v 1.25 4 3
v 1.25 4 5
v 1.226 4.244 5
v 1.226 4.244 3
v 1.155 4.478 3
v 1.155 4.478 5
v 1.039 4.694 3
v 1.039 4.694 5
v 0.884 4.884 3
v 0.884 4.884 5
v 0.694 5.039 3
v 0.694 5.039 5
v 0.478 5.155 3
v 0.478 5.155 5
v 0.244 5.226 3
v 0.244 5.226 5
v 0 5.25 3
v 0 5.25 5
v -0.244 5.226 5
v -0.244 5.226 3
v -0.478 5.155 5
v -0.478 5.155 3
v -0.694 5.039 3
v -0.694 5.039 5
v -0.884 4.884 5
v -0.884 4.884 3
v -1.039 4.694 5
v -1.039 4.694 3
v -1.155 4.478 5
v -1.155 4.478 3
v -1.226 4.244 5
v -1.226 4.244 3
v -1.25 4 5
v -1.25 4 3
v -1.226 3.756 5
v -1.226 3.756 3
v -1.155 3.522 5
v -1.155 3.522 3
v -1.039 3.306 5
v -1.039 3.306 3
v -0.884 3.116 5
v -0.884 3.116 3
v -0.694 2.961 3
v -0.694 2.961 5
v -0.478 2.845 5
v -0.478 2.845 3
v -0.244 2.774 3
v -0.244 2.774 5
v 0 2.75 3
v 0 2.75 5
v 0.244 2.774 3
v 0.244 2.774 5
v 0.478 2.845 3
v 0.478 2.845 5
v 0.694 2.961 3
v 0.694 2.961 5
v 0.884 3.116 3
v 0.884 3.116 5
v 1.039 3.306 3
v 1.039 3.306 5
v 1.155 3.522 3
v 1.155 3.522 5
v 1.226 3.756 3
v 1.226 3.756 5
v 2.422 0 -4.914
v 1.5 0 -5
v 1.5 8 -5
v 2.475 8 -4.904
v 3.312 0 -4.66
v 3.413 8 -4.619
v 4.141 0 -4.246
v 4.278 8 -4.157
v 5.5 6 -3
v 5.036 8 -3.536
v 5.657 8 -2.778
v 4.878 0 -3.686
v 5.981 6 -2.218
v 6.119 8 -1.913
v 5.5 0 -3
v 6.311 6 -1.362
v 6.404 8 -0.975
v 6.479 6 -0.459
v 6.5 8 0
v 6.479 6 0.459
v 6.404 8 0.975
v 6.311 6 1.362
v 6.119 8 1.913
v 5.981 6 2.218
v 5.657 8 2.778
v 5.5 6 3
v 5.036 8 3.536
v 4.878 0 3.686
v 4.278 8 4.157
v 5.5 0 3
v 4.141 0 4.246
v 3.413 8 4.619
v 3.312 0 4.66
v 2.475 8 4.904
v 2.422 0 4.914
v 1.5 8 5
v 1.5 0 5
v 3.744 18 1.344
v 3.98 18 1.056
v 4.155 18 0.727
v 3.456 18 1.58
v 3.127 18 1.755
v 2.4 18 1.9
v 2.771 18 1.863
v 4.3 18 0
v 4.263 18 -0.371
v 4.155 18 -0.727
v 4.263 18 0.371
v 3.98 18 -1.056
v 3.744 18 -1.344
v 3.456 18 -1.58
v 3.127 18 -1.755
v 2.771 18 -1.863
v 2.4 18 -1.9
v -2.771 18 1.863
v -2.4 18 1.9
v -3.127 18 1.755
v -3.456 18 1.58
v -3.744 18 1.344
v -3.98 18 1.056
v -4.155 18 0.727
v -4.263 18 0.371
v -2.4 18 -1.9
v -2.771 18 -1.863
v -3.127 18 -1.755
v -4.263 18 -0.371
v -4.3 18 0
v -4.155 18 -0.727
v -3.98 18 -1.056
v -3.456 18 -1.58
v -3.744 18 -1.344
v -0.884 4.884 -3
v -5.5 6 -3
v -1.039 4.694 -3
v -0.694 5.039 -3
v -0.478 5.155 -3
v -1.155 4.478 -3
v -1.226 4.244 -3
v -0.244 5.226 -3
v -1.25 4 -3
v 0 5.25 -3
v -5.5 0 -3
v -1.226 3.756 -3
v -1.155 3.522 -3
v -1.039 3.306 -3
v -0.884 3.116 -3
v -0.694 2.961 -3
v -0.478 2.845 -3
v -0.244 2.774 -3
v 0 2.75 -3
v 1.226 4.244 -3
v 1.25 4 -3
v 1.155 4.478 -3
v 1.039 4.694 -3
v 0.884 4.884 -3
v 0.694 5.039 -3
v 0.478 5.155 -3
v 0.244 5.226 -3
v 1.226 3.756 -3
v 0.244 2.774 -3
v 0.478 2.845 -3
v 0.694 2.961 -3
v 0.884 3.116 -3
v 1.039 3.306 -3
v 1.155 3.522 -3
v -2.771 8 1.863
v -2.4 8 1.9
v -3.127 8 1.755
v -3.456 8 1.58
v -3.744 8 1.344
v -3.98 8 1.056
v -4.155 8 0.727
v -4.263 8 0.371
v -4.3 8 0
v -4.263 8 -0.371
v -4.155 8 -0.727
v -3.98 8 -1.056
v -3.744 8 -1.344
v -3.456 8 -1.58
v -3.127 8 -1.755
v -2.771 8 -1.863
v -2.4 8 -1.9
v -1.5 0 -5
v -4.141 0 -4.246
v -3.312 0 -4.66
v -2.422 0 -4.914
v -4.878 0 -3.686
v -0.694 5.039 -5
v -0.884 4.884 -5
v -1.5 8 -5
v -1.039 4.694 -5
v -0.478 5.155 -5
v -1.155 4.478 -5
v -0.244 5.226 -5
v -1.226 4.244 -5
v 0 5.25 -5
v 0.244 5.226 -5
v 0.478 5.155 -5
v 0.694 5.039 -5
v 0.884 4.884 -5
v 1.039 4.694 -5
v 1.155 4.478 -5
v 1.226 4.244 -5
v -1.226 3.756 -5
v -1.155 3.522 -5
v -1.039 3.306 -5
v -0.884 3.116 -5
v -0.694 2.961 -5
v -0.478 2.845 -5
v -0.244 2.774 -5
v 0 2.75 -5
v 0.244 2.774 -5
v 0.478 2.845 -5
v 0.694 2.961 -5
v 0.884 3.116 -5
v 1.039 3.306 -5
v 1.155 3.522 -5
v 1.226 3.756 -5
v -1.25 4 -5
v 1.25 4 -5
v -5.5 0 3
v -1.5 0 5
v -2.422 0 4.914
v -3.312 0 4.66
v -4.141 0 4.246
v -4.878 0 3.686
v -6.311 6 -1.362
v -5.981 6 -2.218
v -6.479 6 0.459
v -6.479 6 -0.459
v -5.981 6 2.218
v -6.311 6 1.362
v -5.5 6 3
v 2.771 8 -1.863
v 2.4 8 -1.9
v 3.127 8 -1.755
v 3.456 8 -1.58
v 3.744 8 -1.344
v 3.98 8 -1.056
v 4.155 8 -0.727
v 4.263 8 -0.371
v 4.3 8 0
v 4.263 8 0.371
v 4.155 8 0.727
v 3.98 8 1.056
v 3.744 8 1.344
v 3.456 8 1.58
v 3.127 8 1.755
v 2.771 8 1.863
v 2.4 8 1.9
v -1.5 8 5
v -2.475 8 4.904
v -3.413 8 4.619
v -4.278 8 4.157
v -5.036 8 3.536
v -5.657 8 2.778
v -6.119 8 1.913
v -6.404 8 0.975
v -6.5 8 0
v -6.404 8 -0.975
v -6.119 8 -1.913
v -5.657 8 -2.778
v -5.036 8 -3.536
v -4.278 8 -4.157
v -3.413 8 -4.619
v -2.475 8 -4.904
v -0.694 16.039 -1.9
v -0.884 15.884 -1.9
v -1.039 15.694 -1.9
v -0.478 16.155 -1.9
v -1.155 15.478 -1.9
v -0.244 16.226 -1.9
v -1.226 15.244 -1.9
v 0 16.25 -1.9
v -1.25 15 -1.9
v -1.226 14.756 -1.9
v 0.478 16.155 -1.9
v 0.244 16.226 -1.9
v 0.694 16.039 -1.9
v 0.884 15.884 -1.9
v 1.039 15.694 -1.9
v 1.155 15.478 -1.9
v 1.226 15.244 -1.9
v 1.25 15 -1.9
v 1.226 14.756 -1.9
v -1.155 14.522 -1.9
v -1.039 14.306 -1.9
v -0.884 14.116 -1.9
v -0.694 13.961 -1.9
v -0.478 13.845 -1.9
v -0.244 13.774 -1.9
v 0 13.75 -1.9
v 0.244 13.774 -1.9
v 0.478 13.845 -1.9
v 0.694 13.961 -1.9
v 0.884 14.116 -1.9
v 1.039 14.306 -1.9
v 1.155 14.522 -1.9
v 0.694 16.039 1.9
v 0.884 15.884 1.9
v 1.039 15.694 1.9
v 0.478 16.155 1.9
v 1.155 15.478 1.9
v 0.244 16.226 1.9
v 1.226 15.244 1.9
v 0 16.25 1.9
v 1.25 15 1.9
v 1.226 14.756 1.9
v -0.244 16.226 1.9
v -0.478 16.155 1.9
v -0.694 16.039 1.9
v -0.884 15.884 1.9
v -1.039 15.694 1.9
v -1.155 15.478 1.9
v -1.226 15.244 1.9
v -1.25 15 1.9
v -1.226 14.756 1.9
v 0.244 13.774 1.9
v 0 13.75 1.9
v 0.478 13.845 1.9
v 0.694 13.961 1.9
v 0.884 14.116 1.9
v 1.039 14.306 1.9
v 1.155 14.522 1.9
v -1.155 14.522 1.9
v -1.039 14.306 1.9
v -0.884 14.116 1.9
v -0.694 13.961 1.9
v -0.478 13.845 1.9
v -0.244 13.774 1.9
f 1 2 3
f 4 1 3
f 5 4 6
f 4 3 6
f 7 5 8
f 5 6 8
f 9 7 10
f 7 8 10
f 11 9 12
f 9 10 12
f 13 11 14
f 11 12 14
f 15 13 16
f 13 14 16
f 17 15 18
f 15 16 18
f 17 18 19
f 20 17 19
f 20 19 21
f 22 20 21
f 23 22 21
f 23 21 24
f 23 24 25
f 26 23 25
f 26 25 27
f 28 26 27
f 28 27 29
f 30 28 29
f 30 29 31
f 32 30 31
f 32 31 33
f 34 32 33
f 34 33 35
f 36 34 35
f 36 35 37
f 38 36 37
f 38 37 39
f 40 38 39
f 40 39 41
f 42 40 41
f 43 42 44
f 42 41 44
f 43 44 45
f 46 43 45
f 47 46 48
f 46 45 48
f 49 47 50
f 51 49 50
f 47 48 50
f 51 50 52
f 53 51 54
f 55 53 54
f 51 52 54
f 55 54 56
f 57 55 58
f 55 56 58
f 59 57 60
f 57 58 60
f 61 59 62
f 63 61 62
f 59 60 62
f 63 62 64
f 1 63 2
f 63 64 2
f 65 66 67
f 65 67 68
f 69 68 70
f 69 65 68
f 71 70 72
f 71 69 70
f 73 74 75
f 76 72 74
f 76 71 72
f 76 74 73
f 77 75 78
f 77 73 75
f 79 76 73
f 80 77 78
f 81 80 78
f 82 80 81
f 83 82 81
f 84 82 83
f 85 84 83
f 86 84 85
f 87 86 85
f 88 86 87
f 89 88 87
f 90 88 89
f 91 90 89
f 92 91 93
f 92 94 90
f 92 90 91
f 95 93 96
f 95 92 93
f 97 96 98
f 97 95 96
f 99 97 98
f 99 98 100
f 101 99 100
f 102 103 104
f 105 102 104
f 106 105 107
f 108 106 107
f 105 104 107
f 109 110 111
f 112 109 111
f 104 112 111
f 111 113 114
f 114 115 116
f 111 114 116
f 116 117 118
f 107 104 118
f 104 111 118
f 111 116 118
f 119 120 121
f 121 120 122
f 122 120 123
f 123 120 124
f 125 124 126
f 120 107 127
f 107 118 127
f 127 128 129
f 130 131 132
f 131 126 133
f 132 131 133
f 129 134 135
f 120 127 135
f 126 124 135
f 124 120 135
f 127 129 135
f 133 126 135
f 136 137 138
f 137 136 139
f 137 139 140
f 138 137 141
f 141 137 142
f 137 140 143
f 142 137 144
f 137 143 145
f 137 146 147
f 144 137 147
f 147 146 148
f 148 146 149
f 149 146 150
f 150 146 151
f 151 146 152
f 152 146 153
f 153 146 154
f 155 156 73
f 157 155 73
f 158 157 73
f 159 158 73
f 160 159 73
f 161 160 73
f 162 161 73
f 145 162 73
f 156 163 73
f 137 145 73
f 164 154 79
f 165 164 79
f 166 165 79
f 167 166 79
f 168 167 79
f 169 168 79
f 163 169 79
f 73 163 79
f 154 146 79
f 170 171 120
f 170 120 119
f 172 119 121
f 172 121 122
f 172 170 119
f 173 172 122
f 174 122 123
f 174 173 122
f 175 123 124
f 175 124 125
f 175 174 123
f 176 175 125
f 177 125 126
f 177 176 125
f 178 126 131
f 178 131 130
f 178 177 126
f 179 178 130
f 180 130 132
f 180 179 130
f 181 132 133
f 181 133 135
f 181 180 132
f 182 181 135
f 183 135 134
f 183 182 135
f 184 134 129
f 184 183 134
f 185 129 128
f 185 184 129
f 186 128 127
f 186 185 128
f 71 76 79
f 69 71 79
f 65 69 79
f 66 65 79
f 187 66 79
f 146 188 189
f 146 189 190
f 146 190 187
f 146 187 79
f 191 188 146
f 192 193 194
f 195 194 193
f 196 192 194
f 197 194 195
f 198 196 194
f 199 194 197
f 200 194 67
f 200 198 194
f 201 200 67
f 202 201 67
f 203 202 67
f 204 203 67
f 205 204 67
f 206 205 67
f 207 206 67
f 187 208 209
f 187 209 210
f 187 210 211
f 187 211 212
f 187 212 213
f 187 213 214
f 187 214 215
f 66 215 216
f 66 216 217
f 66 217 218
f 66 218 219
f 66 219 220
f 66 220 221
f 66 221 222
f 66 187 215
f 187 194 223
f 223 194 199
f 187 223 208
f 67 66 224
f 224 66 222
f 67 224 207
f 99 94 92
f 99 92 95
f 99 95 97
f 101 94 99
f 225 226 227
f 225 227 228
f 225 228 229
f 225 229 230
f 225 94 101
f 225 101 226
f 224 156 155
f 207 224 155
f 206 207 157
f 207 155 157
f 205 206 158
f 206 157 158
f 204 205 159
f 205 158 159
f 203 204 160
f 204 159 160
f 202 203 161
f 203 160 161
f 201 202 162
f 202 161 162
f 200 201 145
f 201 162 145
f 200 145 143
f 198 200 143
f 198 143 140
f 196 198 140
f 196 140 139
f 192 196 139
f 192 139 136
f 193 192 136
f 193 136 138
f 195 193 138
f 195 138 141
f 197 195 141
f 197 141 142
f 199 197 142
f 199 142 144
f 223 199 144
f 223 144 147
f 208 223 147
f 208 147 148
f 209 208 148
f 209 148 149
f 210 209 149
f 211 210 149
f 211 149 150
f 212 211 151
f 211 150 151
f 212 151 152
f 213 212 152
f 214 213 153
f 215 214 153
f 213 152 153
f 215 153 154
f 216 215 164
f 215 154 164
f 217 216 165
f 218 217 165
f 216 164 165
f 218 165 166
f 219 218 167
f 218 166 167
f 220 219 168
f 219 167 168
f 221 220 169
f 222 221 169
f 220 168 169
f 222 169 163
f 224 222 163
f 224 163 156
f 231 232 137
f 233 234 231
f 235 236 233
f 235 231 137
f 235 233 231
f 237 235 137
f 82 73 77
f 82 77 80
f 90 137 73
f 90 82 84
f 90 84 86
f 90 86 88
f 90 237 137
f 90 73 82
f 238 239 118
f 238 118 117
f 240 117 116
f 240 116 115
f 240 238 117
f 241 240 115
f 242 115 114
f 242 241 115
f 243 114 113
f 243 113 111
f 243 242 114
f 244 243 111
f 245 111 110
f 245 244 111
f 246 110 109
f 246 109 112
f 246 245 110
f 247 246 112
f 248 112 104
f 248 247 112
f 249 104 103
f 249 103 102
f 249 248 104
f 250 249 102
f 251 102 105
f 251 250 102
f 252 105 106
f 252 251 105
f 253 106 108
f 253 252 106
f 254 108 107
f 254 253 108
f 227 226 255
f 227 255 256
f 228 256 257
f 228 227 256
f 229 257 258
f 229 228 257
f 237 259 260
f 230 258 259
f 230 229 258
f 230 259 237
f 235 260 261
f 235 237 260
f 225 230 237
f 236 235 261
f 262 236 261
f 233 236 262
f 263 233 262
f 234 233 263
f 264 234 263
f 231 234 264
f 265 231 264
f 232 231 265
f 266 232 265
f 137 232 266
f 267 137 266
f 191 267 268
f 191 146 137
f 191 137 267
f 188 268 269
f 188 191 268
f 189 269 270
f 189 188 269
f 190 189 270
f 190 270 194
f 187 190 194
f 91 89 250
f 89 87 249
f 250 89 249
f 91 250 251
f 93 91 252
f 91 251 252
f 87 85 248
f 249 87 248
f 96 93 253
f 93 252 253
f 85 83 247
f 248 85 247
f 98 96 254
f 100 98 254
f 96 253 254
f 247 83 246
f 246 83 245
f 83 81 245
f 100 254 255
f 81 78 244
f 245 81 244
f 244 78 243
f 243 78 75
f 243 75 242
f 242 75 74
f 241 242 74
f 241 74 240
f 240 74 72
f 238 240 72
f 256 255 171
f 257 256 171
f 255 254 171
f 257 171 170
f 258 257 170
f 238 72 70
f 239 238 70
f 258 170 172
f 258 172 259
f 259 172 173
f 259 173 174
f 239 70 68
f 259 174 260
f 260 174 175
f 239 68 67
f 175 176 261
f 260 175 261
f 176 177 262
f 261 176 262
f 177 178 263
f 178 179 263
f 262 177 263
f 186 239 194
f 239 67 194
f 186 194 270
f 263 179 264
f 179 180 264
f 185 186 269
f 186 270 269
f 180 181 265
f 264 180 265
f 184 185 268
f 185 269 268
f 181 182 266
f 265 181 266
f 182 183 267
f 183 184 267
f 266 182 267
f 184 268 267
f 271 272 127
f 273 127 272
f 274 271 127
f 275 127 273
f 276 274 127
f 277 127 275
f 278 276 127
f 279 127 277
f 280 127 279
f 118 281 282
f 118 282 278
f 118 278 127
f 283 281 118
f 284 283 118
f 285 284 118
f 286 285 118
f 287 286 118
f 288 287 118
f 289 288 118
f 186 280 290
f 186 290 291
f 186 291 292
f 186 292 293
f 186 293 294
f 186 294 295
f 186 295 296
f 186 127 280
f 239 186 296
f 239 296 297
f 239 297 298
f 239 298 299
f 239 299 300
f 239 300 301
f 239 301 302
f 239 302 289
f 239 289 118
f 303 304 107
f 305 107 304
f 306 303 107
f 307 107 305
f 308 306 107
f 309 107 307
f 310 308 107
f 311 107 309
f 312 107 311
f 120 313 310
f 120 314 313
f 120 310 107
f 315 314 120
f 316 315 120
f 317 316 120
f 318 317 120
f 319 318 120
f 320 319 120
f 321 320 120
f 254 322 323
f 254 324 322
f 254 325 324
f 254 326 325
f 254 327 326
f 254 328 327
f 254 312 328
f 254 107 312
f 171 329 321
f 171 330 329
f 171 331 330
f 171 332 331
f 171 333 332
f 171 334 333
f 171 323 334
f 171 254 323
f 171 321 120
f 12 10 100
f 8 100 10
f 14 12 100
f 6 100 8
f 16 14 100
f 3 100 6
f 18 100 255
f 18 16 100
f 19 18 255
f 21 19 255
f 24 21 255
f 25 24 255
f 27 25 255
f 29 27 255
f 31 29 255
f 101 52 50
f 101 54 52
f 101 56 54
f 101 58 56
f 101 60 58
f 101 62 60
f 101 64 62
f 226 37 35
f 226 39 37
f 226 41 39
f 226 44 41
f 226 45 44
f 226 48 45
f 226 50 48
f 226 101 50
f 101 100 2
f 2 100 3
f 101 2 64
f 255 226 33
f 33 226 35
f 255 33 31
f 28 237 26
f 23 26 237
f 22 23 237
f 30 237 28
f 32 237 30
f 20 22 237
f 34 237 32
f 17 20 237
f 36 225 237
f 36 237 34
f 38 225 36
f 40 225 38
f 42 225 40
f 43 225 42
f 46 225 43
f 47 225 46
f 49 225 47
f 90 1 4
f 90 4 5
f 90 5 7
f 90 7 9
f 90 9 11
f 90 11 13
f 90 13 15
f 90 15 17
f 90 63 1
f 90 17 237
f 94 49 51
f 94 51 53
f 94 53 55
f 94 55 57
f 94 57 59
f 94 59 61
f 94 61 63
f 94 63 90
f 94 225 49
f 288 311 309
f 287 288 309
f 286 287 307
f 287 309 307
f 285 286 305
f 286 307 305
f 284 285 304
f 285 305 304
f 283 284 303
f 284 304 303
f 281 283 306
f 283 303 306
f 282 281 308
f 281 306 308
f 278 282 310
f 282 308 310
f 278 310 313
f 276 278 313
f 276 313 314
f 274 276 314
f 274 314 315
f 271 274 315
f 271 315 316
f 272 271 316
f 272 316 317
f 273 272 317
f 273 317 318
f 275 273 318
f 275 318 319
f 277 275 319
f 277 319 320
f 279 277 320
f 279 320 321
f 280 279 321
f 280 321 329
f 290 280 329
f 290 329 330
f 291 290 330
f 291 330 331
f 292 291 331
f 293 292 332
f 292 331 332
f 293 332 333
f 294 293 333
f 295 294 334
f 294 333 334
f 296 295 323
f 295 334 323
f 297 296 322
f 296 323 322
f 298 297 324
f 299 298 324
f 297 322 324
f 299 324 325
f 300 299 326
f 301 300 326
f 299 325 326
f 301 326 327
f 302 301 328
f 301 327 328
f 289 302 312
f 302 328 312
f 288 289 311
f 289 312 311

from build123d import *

# Parameters (mm, degrees)
EXTRUDE_1_DEPTH     = 8
EXTRUDE_2_DEPTH     = 10
SKETCH_3_R          = 1.25
CUT_EXTRUDE_1_DEPTH = 6
SKETCH_4_W          = 25.11911159
SKETCH_4_H          = 6
CUT_EXTRUDE_2_DEPTH = 6
SKETCH_5_R          = 1.25
CUT_EXTRUDE_3_DEPTH = 22.592822882


with BuildPart() as part:
    # 草图1 → 凸台-拉伸1 (new body)
    with BuildSketch(Plane(origin=(0, 0, 0), x_dir=(1, 0, 0), z_dir=(0, 1, 0))):
        with BuildLine():
            Line((-1.5, 5), (1.5, 5))
            ThreePointArc((1.5, 5), (6.5, 0), (1.5, -5))
            Line((1.5, -5), (-1.5, -5))
            ThreePointArc((-1.5, -5), (-6.5, 0), (-1.5, 5))
        make_face()
    extrude(amount=EXTRUDE_1_DEPTH)

    # 草图2 → 凸台-拉伸2 (add)
    with BuildSketch(Plane(origin=(0, 8, 0), x_dir=(1, 0, 0), z_dir=(0, 1, 0))):
        with BuildLine():
            Line((-2.4, 1.9), (2.4, 1.9))
            ThreePointArc((2.4, 1.9), (4.3, 0), (2.4, -1.9))
            Line((2.4, -1.9), (-2.4, -1.9))
            ThreePointArc((-2.4, -1.9), (-4.3, 0), (-2.4, 1.9))
        make_face()
    extrude(amount=EXTRUDE_2_DEPTH)

    # 草图3 → 切除-拉伸1 (cut)
    with BuildSketch(Plane.XY.offset(1.9)):
        with Locations((0, 15)):
            Circle(SKETCH_3_R)
    extrude(amount=-CUT_EXTRUDE_1_DEPTH, mode=Mode.SUBTRACT)

    # 草图4 → 切除-拉伸2 (cut)
    with BuildSketch(Plane.XZ):
        Rectangle(SKETCH_4_W, SKETCH_4_H)
    extrude(amount=-CUT_EXTRUDE_2_DEPTH, mode=Mode.SUBTRACT)

    # 草图5 → 切除-拉伸3 (cut, through all)
    with BuildSketch(Plane.XY.offset(5)):
        with Locations((0, 4)):
            Circle(SKETCH_5_R)
    extrude(amount=-CUT_EXTRUDE_3_DEPTH, mode=Mode.SUBTRACT)


solid = part.part
